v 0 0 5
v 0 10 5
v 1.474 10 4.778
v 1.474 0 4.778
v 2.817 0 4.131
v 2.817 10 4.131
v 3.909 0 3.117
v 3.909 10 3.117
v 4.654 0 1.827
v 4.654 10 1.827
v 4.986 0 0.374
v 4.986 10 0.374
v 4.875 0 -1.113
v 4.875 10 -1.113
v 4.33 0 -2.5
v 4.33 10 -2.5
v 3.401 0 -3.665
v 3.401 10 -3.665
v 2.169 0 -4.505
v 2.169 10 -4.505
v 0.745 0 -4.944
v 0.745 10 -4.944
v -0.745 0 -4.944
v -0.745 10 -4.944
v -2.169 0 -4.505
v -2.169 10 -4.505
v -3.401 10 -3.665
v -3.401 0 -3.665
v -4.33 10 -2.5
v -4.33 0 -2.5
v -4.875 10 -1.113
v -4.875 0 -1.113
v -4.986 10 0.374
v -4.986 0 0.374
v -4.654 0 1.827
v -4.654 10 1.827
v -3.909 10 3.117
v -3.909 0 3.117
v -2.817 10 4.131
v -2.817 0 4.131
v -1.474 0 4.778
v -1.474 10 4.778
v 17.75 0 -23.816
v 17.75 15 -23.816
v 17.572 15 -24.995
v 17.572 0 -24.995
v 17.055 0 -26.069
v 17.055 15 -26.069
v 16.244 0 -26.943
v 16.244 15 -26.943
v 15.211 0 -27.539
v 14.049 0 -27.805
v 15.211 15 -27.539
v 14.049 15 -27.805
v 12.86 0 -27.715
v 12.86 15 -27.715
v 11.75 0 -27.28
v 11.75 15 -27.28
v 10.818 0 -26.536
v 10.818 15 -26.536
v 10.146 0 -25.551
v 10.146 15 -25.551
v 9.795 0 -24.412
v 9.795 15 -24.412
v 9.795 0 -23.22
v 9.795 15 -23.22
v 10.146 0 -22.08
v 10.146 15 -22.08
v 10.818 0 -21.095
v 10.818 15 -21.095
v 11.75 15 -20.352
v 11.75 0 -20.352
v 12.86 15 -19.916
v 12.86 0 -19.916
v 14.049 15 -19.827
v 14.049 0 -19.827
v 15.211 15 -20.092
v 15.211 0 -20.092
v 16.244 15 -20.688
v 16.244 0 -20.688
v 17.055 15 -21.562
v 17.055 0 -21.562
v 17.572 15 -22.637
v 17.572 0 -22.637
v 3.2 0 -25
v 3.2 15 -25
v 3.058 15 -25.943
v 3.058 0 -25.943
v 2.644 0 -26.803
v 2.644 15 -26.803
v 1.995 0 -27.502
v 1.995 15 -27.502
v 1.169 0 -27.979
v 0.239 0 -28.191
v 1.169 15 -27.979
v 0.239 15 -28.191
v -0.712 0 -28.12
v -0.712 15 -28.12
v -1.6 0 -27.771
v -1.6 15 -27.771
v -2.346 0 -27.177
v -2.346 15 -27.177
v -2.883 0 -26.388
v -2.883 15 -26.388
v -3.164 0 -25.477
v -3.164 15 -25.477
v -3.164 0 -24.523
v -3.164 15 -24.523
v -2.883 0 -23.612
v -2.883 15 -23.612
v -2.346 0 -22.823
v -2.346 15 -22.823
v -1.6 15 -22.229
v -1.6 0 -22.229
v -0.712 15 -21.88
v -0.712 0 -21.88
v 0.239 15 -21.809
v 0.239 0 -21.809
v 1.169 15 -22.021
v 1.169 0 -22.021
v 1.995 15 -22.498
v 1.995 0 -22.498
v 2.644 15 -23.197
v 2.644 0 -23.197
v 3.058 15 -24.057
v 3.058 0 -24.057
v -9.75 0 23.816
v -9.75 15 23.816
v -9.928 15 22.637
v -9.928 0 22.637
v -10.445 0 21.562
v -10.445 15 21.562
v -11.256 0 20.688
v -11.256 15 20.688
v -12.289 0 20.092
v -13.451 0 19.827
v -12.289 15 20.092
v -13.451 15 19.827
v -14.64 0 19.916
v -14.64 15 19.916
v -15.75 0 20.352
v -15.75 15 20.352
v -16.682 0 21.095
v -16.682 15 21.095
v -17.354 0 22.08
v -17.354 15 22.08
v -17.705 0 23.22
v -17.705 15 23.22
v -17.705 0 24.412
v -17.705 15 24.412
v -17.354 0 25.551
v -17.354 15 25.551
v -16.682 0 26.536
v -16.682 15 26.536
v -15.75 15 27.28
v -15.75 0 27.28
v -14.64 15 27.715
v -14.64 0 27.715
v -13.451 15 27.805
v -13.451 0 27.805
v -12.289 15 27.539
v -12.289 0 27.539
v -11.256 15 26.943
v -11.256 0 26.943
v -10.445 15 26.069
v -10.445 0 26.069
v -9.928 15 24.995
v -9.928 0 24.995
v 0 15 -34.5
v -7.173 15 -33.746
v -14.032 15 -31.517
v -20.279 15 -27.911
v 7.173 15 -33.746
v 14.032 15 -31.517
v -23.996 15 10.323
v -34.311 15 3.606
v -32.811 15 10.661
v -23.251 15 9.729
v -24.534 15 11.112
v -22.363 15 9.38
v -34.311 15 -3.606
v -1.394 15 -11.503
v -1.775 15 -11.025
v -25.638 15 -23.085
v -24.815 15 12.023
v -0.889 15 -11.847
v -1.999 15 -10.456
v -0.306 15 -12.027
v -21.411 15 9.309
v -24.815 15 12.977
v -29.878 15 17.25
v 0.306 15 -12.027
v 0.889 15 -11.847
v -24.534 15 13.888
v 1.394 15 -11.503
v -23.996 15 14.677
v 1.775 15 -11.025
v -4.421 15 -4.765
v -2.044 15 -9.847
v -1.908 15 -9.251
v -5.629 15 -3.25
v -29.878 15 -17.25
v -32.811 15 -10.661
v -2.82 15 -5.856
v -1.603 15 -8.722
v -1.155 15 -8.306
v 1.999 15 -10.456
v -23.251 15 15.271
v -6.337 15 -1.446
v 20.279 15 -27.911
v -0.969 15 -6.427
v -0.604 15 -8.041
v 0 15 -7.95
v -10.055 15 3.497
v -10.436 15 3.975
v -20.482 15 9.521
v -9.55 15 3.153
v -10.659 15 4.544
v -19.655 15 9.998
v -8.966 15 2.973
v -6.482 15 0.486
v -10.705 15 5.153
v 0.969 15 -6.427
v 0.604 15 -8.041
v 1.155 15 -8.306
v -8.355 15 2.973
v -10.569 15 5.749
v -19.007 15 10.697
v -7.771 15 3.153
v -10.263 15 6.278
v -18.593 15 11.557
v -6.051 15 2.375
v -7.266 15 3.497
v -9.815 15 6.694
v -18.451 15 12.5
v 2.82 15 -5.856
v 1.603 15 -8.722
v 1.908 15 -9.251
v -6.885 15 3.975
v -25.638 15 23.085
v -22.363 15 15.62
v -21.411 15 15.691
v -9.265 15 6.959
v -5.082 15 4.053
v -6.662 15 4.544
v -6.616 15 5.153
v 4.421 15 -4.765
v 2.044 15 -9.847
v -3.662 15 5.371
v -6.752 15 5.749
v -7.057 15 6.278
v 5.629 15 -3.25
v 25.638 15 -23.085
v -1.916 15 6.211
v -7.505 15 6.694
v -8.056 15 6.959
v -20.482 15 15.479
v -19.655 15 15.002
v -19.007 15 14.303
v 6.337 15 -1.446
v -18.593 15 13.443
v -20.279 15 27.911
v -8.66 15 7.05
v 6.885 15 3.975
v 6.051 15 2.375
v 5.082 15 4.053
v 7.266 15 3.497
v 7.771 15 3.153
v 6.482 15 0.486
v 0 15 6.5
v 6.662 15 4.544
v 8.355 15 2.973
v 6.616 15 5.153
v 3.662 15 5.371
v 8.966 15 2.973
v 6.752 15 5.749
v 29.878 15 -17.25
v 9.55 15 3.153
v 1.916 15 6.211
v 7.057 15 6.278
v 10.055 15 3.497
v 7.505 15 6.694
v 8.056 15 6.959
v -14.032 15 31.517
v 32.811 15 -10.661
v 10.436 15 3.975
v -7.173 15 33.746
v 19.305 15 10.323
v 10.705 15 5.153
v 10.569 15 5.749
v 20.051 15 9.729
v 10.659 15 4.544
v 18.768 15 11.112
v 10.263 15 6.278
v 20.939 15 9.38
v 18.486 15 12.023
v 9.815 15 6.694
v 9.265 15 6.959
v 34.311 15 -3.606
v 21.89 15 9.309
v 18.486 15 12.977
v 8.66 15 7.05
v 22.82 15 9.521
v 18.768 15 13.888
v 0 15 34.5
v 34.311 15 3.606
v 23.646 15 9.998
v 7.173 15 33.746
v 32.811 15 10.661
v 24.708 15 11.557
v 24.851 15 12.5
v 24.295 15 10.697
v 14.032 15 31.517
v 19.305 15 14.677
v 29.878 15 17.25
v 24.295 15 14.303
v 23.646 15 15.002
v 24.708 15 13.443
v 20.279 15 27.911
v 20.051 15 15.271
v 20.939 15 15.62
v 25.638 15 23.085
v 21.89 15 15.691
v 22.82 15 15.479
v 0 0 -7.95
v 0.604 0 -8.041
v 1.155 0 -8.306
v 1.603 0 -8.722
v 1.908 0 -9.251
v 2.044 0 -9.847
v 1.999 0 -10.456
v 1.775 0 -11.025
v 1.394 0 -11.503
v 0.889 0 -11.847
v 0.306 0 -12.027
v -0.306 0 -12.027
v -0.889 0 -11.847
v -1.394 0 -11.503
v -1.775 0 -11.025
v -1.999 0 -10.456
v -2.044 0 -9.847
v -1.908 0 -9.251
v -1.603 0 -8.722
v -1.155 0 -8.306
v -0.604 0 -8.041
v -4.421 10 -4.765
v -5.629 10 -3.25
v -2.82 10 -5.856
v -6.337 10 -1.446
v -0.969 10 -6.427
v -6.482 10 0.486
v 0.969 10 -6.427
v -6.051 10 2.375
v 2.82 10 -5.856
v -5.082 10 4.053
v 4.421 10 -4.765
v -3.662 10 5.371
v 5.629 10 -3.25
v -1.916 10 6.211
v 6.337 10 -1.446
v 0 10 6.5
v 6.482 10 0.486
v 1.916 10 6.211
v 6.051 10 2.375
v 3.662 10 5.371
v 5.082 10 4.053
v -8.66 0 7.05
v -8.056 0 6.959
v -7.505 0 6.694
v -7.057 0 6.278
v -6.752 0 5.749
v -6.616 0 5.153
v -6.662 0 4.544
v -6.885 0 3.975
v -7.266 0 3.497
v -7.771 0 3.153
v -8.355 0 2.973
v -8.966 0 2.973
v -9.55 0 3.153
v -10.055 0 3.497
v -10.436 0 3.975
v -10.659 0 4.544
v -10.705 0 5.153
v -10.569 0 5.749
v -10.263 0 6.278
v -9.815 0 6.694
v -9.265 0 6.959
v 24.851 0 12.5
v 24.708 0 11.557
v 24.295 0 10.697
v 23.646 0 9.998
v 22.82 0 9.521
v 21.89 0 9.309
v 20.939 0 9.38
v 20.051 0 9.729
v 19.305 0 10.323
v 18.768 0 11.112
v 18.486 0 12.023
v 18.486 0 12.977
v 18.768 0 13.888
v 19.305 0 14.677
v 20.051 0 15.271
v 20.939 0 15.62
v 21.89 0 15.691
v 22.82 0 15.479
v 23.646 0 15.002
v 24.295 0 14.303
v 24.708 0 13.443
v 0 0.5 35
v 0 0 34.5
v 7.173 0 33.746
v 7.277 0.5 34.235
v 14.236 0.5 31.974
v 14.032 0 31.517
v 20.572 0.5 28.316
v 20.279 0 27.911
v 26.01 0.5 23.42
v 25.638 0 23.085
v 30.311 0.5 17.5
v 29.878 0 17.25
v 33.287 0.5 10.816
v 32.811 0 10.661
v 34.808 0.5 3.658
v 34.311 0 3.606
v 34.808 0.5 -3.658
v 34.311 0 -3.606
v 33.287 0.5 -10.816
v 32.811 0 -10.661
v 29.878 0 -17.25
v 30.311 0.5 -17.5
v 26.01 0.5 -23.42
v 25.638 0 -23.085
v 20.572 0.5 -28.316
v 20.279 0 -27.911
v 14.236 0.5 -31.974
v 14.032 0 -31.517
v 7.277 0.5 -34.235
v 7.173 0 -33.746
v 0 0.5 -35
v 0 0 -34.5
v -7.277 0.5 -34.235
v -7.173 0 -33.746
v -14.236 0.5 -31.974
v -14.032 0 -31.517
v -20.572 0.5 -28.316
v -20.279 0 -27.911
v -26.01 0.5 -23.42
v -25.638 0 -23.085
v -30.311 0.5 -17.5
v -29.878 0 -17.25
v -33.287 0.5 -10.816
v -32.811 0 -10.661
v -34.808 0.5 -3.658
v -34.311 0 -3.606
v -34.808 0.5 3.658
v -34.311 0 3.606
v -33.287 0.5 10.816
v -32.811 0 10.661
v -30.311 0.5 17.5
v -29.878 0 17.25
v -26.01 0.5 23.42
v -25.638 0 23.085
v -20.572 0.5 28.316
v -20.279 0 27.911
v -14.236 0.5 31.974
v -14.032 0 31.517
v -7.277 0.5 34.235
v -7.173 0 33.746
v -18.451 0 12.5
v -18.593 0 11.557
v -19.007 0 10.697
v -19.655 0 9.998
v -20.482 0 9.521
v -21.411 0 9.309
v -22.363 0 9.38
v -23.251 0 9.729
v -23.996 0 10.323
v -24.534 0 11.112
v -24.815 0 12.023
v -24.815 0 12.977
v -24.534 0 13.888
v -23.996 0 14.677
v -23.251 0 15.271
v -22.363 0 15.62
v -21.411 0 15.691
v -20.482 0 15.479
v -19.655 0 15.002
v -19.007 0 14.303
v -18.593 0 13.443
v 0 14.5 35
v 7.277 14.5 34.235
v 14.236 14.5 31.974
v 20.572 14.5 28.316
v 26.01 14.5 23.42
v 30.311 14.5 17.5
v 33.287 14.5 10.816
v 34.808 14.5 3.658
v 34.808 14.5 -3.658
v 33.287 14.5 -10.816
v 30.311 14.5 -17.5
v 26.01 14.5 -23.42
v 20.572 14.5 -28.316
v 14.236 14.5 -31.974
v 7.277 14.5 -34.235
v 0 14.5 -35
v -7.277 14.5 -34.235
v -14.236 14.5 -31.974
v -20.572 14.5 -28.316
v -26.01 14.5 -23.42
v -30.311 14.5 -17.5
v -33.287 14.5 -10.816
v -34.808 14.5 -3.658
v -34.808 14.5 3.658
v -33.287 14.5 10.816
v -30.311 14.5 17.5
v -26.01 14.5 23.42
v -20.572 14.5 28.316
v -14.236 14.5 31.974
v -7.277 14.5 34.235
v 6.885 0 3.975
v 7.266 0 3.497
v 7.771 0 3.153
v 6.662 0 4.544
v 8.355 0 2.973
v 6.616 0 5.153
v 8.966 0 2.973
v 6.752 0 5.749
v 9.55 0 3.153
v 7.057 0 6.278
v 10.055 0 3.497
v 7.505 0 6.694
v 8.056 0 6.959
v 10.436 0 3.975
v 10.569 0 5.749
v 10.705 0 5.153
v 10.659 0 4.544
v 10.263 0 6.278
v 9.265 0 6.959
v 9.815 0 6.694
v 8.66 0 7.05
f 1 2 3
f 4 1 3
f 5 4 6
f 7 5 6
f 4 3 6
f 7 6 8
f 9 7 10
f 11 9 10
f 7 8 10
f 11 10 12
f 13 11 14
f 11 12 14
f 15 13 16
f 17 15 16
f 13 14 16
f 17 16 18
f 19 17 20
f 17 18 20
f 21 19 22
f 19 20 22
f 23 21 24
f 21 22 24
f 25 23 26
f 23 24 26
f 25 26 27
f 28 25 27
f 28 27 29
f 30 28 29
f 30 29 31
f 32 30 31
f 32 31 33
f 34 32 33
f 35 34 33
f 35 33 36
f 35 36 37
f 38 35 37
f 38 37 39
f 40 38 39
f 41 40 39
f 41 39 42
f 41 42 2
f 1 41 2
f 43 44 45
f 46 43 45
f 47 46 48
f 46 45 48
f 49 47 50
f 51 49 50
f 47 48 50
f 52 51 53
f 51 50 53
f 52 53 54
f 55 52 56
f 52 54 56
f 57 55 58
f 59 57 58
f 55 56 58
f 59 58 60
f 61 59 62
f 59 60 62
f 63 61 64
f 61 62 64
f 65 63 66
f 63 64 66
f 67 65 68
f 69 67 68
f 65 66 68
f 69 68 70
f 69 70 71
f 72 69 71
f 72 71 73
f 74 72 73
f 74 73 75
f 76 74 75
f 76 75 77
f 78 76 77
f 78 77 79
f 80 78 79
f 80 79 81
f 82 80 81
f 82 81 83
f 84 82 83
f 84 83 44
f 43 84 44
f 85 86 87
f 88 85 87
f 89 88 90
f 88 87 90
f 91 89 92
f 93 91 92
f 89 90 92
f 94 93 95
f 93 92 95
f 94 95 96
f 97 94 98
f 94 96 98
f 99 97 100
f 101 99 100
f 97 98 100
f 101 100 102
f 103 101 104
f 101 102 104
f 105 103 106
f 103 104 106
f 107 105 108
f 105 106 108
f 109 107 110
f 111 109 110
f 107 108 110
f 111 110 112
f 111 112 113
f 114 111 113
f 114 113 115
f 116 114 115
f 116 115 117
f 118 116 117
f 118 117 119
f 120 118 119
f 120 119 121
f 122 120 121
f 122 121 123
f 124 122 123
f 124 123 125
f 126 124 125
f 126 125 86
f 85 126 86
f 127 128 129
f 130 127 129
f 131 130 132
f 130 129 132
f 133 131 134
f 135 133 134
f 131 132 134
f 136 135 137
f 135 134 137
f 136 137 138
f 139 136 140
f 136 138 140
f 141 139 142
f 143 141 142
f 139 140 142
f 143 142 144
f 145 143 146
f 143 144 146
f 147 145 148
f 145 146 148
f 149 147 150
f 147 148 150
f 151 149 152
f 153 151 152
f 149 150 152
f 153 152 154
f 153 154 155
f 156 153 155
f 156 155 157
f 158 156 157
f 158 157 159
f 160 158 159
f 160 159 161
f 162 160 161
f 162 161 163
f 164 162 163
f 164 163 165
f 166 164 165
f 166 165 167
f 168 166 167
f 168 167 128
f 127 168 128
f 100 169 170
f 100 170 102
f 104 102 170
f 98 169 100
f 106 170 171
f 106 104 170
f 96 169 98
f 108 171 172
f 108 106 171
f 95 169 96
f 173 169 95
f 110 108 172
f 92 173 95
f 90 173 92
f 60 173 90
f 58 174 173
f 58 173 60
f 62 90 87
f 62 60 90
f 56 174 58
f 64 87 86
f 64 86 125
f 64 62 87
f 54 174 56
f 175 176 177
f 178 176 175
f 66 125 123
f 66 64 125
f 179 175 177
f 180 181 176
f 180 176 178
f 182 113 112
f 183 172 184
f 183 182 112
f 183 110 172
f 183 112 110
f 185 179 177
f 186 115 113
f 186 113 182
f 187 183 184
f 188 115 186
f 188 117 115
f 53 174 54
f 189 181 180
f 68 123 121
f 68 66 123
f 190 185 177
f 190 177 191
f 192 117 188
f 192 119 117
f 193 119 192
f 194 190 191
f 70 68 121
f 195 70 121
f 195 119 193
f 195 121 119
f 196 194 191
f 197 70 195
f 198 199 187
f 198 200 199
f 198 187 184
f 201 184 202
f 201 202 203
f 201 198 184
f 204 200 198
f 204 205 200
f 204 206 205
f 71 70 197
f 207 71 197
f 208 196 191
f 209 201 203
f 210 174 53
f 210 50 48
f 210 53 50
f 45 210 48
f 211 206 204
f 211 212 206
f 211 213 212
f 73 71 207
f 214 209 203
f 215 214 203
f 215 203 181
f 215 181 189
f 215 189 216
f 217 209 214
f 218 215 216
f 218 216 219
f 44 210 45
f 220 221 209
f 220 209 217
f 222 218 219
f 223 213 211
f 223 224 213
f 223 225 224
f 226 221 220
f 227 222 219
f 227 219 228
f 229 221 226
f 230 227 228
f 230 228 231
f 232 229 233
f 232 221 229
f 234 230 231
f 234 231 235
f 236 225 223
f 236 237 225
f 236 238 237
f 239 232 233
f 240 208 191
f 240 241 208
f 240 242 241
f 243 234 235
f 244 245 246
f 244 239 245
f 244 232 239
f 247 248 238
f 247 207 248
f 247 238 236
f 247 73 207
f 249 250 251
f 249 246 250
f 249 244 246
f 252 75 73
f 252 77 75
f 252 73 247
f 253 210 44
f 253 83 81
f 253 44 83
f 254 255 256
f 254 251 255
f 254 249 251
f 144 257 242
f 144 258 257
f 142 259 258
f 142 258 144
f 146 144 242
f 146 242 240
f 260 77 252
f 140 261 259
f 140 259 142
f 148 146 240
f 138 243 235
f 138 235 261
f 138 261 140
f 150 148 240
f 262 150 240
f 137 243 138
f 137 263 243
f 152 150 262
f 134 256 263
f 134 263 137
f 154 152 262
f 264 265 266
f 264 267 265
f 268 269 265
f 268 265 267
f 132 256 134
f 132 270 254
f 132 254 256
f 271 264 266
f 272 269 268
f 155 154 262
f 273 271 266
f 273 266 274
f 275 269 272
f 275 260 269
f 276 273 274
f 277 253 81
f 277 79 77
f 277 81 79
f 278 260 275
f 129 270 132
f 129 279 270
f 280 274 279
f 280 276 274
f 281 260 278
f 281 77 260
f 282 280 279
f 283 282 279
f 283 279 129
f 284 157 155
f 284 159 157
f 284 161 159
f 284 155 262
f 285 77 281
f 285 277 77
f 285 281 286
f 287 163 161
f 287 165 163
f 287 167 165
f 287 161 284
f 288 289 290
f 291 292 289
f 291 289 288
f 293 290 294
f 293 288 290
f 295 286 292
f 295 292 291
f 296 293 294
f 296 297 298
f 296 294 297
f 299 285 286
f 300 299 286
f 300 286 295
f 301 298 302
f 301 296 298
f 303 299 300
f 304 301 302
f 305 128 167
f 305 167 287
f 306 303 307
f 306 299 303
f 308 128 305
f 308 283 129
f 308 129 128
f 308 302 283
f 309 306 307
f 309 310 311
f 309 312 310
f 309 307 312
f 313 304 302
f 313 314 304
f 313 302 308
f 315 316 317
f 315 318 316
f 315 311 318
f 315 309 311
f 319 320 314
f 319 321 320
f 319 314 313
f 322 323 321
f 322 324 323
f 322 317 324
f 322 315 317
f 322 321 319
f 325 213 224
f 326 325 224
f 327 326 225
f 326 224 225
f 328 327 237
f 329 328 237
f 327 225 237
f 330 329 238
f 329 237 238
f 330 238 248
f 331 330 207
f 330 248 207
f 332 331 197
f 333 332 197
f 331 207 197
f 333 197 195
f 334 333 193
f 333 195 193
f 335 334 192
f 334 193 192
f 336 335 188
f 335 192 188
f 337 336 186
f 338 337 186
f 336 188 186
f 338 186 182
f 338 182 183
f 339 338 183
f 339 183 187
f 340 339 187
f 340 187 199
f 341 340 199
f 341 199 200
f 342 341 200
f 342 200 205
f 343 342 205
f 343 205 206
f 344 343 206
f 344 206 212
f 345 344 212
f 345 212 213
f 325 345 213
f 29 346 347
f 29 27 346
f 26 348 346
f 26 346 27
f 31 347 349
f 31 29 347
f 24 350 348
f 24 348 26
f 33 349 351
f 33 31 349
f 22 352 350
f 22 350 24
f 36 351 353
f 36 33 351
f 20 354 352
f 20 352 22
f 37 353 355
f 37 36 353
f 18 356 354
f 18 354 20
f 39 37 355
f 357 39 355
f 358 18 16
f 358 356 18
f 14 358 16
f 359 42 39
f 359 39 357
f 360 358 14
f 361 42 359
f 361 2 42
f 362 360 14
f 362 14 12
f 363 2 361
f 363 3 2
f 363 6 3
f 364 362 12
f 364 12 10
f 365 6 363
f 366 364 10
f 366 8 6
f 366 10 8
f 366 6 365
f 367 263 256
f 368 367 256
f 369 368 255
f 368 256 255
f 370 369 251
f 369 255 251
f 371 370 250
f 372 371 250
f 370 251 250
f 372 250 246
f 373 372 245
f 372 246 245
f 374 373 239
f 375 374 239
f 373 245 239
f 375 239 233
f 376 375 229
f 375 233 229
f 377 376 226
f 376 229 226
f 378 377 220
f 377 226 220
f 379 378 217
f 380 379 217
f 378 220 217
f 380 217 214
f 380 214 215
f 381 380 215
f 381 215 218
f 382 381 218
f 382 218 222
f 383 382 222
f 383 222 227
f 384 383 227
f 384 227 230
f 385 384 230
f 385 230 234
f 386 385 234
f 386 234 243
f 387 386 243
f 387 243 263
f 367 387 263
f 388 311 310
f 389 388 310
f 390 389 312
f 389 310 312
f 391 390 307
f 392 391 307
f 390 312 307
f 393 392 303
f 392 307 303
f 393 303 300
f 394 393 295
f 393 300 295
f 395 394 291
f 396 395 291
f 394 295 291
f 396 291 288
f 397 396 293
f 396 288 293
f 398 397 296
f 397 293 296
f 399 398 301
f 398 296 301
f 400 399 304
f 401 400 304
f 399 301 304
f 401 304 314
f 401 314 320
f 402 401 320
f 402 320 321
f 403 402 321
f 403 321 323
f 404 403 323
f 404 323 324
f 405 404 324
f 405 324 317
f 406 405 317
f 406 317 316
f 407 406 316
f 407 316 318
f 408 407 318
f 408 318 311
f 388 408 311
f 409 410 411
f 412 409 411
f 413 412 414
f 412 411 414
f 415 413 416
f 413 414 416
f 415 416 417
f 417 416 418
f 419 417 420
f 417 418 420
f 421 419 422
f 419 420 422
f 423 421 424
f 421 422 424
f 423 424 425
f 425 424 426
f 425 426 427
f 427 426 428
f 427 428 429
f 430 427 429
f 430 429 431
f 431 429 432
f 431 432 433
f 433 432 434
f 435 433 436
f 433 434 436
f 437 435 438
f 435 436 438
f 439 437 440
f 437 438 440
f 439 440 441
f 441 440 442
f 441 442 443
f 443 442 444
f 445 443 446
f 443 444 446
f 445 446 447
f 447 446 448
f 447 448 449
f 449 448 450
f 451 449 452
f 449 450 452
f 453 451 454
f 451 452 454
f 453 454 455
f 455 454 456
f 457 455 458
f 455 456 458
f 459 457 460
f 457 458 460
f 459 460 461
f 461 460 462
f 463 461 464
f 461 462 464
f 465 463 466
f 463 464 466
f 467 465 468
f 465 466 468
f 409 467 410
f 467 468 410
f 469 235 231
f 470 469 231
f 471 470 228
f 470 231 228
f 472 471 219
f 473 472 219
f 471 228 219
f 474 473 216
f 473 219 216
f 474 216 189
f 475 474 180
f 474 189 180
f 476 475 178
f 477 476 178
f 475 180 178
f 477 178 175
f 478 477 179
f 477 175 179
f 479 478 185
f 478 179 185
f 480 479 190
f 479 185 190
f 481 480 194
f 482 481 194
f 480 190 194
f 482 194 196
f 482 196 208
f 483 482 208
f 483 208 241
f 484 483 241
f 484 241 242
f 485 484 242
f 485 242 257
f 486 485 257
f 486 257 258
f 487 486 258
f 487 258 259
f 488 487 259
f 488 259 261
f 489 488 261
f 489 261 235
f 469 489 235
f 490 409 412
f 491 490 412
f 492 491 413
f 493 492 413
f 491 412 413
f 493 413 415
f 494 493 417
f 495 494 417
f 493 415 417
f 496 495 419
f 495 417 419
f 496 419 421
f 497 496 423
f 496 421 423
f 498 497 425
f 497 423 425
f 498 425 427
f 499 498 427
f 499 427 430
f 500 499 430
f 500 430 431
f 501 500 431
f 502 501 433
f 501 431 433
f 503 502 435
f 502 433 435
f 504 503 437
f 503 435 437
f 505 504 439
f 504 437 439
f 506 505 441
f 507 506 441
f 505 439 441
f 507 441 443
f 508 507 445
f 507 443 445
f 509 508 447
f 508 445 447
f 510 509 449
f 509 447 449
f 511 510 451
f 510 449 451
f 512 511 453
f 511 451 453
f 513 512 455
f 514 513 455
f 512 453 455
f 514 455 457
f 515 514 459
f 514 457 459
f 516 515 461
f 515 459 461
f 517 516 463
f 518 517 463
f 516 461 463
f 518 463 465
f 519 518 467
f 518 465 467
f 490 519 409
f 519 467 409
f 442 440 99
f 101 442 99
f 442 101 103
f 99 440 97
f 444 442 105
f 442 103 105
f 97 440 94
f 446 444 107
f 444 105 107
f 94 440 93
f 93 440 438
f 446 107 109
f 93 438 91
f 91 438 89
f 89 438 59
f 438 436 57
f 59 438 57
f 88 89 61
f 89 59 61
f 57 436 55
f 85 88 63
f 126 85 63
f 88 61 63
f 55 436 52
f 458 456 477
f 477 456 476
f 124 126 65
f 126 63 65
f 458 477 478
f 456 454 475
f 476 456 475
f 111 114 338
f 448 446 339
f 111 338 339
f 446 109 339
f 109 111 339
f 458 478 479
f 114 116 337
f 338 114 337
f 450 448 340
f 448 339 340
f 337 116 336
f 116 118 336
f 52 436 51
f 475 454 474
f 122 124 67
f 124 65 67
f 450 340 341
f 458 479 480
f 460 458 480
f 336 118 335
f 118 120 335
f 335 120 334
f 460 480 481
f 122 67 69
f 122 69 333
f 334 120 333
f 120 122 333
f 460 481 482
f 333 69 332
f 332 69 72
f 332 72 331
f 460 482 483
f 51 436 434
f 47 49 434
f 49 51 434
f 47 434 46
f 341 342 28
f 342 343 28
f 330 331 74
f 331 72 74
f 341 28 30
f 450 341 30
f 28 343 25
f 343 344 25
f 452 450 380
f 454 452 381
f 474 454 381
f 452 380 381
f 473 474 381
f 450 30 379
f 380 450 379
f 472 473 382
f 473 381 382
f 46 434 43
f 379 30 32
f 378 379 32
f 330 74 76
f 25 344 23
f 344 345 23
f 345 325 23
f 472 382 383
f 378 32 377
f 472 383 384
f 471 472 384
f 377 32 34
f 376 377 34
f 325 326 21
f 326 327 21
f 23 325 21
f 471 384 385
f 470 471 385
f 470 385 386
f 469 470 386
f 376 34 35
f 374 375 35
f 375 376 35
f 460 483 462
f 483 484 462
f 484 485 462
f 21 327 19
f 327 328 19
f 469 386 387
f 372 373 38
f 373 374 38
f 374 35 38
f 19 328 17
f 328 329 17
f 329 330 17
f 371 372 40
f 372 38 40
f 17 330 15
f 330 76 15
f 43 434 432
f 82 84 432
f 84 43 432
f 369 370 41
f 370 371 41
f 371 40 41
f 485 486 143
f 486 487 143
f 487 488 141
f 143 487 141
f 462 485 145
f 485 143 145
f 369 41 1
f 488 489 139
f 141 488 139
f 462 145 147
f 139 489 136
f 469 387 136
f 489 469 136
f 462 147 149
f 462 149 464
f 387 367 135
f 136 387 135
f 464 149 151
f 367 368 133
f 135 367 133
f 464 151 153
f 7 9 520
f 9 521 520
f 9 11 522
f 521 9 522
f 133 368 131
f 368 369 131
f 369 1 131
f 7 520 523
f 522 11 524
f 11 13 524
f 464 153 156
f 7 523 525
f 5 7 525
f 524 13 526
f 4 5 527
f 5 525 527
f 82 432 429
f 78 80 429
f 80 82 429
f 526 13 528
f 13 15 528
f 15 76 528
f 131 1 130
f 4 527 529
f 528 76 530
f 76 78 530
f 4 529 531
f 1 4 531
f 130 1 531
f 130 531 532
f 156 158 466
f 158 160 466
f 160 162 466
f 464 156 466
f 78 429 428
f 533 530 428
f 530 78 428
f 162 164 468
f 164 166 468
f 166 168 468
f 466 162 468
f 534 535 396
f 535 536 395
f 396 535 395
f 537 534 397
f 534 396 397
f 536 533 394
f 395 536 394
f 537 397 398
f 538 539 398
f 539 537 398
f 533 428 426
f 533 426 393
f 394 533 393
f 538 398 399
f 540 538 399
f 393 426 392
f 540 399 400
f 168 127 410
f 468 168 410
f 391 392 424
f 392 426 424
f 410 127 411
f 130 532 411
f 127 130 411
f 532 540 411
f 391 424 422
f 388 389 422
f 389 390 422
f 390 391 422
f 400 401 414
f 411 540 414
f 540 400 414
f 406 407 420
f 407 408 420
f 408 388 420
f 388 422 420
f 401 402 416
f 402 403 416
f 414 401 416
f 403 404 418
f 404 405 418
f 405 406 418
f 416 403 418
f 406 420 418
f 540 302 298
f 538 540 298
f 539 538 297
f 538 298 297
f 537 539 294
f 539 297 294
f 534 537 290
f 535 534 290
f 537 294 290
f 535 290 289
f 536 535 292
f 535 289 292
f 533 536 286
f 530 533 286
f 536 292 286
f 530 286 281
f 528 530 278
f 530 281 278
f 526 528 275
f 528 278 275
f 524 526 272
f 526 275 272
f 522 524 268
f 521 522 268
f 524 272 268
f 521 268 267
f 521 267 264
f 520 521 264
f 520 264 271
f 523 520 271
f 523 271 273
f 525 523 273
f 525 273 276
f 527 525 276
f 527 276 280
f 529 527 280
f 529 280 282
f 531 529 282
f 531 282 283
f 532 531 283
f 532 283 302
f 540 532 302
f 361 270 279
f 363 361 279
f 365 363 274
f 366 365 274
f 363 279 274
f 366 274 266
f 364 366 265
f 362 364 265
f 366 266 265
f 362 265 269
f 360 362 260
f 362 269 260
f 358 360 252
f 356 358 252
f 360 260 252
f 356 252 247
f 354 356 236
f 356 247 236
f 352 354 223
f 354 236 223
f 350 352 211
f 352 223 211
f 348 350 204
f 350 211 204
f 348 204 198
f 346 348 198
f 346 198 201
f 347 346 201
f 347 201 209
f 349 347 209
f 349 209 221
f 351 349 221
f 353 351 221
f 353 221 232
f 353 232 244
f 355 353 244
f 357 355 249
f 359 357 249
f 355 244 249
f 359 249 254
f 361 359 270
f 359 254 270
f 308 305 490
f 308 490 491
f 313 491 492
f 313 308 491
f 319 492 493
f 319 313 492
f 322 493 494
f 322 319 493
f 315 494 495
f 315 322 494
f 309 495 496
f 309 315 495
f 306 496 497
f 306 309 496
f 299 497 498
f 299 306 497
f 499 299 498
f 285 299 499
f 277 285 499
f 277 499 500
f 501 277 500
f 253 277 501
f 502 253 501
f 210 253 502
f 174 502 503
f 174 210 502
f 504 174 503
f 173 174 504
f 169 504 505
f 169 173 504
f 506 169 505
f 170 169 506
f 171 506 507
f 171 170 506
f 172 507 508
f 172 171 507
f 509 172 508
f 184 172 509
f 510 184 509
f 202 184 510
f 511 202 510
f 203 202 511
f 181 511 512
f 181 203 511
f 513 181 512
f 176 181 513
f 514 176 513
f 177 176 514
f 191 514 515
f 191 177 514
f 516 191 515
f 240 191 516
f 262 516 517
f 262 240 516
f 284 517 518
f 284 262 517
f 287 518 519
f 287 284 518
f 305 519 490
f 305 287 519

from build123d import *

# Parameters (mm, degrees)
SKETCH1_R             = 35
BOSS_EXTRUDE1_DEPTH   = 15
CUT_EXTRUDE1_REACH    = 53.72
SKETCH2_R             = 5
SKETCH3_R             = 6.5
CUT_EXTRUDE2_DEPTH    = 5
CUT_EXTRUDE3_REACH    = 53.72
SKETCH4_R             = 2.05
M6_CLEARANCE_HOLE1_D  = 6.4
F_8_0MM_DOWEL_HOLE1_D = 8
CHAMFER1_SIZE         = 0.5


with BuildPart() as part:
    # Sketch1 → Boss-Extrude1 (new body)
    with BuildSketch(Plane(origin=(0, 0, 0), x_dir=(1, 0, 0), z_dir=(0, 1, 0))):
        with Locations(Location((0, 0, 0), (0, 0, 270))):
            Circle(SKETCH1_R)
    extrude(amount=BOSS_EXTRUDE1_DEPTH)

    # Sketch2 → Cut-Extrude1 (cut, up to next)
    with BuildSketch(Plane(origin=(0, 15, 0), x_dir=(1, 0, 0), z_dir=(0, 1, 0)), mode=Mode.PRIVATE) as cut_extrude1_sk1:
        with Locations(Location((0, 0, 0), (0, 0, 270))):
            Circle(SKETCH2_R)
    cut_extrude1_tool1 = extrude(cut_extrude1_sk1.sketch, amount=-CUT_EXTRUDE1_REACH, mode=Mode.PRIVATE) & part.part
    add(cut_extrude1_tool1.solids().sort_by_distance((0, 15, 0))[0], mode=Mode.SUBTRACT)

    # Sketch3 → Cut-Extrude2 (cut)
    with BuildSketch(Plane(origin=(0, 15, 0), x_dir=(1, 0, 0), z_dir=(0, 1, 0))):
        with Locations(Location((0, 0, 0), (0, 0, 270))):
            Circle(SKETCH3_R)
    extrude(amount=-CUT_EXTRUDE2_DEPTH, mode=Mode.SUBTRACT)

    # Sketch4 → Cut-Extrude3 (cut, up to next)
    with BuildSketch(Plane(origin=(0, 15, 0), x_dir=(1, 0, 0), z_dir=(0, 1, 0)), mode=Mode.PRIVATE) as cut_extrude3_sk1:
        with Locations(Location((0, 10, 0), (0, 0, 270))):
            Circle(SKETCH4_R)
    cut_extrude3_tool1 = extrude(cut_extrude3_sk1.sketch, amount=-CUT_EXTRUDE3_REACH, mode=Mode.PRIVATE) & part.part
    # Sketch4 → Cut-Extrude3 (cut, up to next)
    with BuildSketch(Plane(origin=(0, 15, 0), x_dir=(1, 0, 0), z_dir=(0, 1, 0)), mode=Mode.PRIVATE) as cut_extrude3_sk2:
        with Locations(Location((8.660254038, -5, 0), (0, 0, 270))):
            Circle(SKETCH4_R)
    cut_extrude3_tool2 = extrude(cut_extrude3_sk2.sketch, amount=-CUT_EXTRUDE3_REACH, mode=Mode.PRIVATE) & part.part
    # Sketch4 → Cut-Extrude3 (cut, up to next)
    with BuildSketch(Plane(origin=(0, 15, 0), x_dir=(1, 0, 0), z_dir=(0, 1, 0)), mode=Mode.PRIVATE) as cut_extrude3_sk3:
        with Locations(Location((-8.660254038, -5, 0), (0, 0, 270))):
            Circle(SKETCH4_R)
    cut_extrude3_tool3 = extrude(cut_extrude3_sk3.sketch, amount=-CUT_EXTRUDE3_REACH, mode=Mode.PRIVATE) & part.part
    add(cut_extrude3_tool1.solids().sort_by_distance((0, 15, -10))[0], mode=Mode.SUBTRACT)
    add(cut_extrude3_tool2.solids().sort_by_distance((8.660254, 15, 5))[0], mode=Mode.SUBTRACT)
    add(cut_extrude3_tool3.solids().sort_by_distance((-8.660254, 15, 5))[0], mode=Mode.SUBTRACT)

    # M6 Clearance Hole1 (through all)
    with Locations(Plane(origin=(0, 0, 0), x_dir=(-1, 0, 0), z_dir=(0, -1, 0))):
        with Locations((0, 25), (21.650635095, -12.5), (-21.650635095, -12.5)):
            Hole(M6_CLEARANCE_HOLE1_D / 2)

    # Ø8.0mm Dowel Hole1 (through all)
    with Locations(Plane(origin=(0, 0, 0), x_dir=(-1, 0, 0), z_dir=(0, -1, 0))):
        with Locations((-13.75, 23.815698604), (13.75, -23.815698604)):
            Hole(F_8_0MM_DOWEL_HOLE1_D / 2)

    # Chamfer1
    chamfer1_edges = [part.edges().sort_by_distance(p)[0] for p in [
        (0, 0, -35),
        (0, 15, -35),
    ]]
    chamfer(chamfer1_edges, length=CHAMFER1_SIZE)


solid = part.part
